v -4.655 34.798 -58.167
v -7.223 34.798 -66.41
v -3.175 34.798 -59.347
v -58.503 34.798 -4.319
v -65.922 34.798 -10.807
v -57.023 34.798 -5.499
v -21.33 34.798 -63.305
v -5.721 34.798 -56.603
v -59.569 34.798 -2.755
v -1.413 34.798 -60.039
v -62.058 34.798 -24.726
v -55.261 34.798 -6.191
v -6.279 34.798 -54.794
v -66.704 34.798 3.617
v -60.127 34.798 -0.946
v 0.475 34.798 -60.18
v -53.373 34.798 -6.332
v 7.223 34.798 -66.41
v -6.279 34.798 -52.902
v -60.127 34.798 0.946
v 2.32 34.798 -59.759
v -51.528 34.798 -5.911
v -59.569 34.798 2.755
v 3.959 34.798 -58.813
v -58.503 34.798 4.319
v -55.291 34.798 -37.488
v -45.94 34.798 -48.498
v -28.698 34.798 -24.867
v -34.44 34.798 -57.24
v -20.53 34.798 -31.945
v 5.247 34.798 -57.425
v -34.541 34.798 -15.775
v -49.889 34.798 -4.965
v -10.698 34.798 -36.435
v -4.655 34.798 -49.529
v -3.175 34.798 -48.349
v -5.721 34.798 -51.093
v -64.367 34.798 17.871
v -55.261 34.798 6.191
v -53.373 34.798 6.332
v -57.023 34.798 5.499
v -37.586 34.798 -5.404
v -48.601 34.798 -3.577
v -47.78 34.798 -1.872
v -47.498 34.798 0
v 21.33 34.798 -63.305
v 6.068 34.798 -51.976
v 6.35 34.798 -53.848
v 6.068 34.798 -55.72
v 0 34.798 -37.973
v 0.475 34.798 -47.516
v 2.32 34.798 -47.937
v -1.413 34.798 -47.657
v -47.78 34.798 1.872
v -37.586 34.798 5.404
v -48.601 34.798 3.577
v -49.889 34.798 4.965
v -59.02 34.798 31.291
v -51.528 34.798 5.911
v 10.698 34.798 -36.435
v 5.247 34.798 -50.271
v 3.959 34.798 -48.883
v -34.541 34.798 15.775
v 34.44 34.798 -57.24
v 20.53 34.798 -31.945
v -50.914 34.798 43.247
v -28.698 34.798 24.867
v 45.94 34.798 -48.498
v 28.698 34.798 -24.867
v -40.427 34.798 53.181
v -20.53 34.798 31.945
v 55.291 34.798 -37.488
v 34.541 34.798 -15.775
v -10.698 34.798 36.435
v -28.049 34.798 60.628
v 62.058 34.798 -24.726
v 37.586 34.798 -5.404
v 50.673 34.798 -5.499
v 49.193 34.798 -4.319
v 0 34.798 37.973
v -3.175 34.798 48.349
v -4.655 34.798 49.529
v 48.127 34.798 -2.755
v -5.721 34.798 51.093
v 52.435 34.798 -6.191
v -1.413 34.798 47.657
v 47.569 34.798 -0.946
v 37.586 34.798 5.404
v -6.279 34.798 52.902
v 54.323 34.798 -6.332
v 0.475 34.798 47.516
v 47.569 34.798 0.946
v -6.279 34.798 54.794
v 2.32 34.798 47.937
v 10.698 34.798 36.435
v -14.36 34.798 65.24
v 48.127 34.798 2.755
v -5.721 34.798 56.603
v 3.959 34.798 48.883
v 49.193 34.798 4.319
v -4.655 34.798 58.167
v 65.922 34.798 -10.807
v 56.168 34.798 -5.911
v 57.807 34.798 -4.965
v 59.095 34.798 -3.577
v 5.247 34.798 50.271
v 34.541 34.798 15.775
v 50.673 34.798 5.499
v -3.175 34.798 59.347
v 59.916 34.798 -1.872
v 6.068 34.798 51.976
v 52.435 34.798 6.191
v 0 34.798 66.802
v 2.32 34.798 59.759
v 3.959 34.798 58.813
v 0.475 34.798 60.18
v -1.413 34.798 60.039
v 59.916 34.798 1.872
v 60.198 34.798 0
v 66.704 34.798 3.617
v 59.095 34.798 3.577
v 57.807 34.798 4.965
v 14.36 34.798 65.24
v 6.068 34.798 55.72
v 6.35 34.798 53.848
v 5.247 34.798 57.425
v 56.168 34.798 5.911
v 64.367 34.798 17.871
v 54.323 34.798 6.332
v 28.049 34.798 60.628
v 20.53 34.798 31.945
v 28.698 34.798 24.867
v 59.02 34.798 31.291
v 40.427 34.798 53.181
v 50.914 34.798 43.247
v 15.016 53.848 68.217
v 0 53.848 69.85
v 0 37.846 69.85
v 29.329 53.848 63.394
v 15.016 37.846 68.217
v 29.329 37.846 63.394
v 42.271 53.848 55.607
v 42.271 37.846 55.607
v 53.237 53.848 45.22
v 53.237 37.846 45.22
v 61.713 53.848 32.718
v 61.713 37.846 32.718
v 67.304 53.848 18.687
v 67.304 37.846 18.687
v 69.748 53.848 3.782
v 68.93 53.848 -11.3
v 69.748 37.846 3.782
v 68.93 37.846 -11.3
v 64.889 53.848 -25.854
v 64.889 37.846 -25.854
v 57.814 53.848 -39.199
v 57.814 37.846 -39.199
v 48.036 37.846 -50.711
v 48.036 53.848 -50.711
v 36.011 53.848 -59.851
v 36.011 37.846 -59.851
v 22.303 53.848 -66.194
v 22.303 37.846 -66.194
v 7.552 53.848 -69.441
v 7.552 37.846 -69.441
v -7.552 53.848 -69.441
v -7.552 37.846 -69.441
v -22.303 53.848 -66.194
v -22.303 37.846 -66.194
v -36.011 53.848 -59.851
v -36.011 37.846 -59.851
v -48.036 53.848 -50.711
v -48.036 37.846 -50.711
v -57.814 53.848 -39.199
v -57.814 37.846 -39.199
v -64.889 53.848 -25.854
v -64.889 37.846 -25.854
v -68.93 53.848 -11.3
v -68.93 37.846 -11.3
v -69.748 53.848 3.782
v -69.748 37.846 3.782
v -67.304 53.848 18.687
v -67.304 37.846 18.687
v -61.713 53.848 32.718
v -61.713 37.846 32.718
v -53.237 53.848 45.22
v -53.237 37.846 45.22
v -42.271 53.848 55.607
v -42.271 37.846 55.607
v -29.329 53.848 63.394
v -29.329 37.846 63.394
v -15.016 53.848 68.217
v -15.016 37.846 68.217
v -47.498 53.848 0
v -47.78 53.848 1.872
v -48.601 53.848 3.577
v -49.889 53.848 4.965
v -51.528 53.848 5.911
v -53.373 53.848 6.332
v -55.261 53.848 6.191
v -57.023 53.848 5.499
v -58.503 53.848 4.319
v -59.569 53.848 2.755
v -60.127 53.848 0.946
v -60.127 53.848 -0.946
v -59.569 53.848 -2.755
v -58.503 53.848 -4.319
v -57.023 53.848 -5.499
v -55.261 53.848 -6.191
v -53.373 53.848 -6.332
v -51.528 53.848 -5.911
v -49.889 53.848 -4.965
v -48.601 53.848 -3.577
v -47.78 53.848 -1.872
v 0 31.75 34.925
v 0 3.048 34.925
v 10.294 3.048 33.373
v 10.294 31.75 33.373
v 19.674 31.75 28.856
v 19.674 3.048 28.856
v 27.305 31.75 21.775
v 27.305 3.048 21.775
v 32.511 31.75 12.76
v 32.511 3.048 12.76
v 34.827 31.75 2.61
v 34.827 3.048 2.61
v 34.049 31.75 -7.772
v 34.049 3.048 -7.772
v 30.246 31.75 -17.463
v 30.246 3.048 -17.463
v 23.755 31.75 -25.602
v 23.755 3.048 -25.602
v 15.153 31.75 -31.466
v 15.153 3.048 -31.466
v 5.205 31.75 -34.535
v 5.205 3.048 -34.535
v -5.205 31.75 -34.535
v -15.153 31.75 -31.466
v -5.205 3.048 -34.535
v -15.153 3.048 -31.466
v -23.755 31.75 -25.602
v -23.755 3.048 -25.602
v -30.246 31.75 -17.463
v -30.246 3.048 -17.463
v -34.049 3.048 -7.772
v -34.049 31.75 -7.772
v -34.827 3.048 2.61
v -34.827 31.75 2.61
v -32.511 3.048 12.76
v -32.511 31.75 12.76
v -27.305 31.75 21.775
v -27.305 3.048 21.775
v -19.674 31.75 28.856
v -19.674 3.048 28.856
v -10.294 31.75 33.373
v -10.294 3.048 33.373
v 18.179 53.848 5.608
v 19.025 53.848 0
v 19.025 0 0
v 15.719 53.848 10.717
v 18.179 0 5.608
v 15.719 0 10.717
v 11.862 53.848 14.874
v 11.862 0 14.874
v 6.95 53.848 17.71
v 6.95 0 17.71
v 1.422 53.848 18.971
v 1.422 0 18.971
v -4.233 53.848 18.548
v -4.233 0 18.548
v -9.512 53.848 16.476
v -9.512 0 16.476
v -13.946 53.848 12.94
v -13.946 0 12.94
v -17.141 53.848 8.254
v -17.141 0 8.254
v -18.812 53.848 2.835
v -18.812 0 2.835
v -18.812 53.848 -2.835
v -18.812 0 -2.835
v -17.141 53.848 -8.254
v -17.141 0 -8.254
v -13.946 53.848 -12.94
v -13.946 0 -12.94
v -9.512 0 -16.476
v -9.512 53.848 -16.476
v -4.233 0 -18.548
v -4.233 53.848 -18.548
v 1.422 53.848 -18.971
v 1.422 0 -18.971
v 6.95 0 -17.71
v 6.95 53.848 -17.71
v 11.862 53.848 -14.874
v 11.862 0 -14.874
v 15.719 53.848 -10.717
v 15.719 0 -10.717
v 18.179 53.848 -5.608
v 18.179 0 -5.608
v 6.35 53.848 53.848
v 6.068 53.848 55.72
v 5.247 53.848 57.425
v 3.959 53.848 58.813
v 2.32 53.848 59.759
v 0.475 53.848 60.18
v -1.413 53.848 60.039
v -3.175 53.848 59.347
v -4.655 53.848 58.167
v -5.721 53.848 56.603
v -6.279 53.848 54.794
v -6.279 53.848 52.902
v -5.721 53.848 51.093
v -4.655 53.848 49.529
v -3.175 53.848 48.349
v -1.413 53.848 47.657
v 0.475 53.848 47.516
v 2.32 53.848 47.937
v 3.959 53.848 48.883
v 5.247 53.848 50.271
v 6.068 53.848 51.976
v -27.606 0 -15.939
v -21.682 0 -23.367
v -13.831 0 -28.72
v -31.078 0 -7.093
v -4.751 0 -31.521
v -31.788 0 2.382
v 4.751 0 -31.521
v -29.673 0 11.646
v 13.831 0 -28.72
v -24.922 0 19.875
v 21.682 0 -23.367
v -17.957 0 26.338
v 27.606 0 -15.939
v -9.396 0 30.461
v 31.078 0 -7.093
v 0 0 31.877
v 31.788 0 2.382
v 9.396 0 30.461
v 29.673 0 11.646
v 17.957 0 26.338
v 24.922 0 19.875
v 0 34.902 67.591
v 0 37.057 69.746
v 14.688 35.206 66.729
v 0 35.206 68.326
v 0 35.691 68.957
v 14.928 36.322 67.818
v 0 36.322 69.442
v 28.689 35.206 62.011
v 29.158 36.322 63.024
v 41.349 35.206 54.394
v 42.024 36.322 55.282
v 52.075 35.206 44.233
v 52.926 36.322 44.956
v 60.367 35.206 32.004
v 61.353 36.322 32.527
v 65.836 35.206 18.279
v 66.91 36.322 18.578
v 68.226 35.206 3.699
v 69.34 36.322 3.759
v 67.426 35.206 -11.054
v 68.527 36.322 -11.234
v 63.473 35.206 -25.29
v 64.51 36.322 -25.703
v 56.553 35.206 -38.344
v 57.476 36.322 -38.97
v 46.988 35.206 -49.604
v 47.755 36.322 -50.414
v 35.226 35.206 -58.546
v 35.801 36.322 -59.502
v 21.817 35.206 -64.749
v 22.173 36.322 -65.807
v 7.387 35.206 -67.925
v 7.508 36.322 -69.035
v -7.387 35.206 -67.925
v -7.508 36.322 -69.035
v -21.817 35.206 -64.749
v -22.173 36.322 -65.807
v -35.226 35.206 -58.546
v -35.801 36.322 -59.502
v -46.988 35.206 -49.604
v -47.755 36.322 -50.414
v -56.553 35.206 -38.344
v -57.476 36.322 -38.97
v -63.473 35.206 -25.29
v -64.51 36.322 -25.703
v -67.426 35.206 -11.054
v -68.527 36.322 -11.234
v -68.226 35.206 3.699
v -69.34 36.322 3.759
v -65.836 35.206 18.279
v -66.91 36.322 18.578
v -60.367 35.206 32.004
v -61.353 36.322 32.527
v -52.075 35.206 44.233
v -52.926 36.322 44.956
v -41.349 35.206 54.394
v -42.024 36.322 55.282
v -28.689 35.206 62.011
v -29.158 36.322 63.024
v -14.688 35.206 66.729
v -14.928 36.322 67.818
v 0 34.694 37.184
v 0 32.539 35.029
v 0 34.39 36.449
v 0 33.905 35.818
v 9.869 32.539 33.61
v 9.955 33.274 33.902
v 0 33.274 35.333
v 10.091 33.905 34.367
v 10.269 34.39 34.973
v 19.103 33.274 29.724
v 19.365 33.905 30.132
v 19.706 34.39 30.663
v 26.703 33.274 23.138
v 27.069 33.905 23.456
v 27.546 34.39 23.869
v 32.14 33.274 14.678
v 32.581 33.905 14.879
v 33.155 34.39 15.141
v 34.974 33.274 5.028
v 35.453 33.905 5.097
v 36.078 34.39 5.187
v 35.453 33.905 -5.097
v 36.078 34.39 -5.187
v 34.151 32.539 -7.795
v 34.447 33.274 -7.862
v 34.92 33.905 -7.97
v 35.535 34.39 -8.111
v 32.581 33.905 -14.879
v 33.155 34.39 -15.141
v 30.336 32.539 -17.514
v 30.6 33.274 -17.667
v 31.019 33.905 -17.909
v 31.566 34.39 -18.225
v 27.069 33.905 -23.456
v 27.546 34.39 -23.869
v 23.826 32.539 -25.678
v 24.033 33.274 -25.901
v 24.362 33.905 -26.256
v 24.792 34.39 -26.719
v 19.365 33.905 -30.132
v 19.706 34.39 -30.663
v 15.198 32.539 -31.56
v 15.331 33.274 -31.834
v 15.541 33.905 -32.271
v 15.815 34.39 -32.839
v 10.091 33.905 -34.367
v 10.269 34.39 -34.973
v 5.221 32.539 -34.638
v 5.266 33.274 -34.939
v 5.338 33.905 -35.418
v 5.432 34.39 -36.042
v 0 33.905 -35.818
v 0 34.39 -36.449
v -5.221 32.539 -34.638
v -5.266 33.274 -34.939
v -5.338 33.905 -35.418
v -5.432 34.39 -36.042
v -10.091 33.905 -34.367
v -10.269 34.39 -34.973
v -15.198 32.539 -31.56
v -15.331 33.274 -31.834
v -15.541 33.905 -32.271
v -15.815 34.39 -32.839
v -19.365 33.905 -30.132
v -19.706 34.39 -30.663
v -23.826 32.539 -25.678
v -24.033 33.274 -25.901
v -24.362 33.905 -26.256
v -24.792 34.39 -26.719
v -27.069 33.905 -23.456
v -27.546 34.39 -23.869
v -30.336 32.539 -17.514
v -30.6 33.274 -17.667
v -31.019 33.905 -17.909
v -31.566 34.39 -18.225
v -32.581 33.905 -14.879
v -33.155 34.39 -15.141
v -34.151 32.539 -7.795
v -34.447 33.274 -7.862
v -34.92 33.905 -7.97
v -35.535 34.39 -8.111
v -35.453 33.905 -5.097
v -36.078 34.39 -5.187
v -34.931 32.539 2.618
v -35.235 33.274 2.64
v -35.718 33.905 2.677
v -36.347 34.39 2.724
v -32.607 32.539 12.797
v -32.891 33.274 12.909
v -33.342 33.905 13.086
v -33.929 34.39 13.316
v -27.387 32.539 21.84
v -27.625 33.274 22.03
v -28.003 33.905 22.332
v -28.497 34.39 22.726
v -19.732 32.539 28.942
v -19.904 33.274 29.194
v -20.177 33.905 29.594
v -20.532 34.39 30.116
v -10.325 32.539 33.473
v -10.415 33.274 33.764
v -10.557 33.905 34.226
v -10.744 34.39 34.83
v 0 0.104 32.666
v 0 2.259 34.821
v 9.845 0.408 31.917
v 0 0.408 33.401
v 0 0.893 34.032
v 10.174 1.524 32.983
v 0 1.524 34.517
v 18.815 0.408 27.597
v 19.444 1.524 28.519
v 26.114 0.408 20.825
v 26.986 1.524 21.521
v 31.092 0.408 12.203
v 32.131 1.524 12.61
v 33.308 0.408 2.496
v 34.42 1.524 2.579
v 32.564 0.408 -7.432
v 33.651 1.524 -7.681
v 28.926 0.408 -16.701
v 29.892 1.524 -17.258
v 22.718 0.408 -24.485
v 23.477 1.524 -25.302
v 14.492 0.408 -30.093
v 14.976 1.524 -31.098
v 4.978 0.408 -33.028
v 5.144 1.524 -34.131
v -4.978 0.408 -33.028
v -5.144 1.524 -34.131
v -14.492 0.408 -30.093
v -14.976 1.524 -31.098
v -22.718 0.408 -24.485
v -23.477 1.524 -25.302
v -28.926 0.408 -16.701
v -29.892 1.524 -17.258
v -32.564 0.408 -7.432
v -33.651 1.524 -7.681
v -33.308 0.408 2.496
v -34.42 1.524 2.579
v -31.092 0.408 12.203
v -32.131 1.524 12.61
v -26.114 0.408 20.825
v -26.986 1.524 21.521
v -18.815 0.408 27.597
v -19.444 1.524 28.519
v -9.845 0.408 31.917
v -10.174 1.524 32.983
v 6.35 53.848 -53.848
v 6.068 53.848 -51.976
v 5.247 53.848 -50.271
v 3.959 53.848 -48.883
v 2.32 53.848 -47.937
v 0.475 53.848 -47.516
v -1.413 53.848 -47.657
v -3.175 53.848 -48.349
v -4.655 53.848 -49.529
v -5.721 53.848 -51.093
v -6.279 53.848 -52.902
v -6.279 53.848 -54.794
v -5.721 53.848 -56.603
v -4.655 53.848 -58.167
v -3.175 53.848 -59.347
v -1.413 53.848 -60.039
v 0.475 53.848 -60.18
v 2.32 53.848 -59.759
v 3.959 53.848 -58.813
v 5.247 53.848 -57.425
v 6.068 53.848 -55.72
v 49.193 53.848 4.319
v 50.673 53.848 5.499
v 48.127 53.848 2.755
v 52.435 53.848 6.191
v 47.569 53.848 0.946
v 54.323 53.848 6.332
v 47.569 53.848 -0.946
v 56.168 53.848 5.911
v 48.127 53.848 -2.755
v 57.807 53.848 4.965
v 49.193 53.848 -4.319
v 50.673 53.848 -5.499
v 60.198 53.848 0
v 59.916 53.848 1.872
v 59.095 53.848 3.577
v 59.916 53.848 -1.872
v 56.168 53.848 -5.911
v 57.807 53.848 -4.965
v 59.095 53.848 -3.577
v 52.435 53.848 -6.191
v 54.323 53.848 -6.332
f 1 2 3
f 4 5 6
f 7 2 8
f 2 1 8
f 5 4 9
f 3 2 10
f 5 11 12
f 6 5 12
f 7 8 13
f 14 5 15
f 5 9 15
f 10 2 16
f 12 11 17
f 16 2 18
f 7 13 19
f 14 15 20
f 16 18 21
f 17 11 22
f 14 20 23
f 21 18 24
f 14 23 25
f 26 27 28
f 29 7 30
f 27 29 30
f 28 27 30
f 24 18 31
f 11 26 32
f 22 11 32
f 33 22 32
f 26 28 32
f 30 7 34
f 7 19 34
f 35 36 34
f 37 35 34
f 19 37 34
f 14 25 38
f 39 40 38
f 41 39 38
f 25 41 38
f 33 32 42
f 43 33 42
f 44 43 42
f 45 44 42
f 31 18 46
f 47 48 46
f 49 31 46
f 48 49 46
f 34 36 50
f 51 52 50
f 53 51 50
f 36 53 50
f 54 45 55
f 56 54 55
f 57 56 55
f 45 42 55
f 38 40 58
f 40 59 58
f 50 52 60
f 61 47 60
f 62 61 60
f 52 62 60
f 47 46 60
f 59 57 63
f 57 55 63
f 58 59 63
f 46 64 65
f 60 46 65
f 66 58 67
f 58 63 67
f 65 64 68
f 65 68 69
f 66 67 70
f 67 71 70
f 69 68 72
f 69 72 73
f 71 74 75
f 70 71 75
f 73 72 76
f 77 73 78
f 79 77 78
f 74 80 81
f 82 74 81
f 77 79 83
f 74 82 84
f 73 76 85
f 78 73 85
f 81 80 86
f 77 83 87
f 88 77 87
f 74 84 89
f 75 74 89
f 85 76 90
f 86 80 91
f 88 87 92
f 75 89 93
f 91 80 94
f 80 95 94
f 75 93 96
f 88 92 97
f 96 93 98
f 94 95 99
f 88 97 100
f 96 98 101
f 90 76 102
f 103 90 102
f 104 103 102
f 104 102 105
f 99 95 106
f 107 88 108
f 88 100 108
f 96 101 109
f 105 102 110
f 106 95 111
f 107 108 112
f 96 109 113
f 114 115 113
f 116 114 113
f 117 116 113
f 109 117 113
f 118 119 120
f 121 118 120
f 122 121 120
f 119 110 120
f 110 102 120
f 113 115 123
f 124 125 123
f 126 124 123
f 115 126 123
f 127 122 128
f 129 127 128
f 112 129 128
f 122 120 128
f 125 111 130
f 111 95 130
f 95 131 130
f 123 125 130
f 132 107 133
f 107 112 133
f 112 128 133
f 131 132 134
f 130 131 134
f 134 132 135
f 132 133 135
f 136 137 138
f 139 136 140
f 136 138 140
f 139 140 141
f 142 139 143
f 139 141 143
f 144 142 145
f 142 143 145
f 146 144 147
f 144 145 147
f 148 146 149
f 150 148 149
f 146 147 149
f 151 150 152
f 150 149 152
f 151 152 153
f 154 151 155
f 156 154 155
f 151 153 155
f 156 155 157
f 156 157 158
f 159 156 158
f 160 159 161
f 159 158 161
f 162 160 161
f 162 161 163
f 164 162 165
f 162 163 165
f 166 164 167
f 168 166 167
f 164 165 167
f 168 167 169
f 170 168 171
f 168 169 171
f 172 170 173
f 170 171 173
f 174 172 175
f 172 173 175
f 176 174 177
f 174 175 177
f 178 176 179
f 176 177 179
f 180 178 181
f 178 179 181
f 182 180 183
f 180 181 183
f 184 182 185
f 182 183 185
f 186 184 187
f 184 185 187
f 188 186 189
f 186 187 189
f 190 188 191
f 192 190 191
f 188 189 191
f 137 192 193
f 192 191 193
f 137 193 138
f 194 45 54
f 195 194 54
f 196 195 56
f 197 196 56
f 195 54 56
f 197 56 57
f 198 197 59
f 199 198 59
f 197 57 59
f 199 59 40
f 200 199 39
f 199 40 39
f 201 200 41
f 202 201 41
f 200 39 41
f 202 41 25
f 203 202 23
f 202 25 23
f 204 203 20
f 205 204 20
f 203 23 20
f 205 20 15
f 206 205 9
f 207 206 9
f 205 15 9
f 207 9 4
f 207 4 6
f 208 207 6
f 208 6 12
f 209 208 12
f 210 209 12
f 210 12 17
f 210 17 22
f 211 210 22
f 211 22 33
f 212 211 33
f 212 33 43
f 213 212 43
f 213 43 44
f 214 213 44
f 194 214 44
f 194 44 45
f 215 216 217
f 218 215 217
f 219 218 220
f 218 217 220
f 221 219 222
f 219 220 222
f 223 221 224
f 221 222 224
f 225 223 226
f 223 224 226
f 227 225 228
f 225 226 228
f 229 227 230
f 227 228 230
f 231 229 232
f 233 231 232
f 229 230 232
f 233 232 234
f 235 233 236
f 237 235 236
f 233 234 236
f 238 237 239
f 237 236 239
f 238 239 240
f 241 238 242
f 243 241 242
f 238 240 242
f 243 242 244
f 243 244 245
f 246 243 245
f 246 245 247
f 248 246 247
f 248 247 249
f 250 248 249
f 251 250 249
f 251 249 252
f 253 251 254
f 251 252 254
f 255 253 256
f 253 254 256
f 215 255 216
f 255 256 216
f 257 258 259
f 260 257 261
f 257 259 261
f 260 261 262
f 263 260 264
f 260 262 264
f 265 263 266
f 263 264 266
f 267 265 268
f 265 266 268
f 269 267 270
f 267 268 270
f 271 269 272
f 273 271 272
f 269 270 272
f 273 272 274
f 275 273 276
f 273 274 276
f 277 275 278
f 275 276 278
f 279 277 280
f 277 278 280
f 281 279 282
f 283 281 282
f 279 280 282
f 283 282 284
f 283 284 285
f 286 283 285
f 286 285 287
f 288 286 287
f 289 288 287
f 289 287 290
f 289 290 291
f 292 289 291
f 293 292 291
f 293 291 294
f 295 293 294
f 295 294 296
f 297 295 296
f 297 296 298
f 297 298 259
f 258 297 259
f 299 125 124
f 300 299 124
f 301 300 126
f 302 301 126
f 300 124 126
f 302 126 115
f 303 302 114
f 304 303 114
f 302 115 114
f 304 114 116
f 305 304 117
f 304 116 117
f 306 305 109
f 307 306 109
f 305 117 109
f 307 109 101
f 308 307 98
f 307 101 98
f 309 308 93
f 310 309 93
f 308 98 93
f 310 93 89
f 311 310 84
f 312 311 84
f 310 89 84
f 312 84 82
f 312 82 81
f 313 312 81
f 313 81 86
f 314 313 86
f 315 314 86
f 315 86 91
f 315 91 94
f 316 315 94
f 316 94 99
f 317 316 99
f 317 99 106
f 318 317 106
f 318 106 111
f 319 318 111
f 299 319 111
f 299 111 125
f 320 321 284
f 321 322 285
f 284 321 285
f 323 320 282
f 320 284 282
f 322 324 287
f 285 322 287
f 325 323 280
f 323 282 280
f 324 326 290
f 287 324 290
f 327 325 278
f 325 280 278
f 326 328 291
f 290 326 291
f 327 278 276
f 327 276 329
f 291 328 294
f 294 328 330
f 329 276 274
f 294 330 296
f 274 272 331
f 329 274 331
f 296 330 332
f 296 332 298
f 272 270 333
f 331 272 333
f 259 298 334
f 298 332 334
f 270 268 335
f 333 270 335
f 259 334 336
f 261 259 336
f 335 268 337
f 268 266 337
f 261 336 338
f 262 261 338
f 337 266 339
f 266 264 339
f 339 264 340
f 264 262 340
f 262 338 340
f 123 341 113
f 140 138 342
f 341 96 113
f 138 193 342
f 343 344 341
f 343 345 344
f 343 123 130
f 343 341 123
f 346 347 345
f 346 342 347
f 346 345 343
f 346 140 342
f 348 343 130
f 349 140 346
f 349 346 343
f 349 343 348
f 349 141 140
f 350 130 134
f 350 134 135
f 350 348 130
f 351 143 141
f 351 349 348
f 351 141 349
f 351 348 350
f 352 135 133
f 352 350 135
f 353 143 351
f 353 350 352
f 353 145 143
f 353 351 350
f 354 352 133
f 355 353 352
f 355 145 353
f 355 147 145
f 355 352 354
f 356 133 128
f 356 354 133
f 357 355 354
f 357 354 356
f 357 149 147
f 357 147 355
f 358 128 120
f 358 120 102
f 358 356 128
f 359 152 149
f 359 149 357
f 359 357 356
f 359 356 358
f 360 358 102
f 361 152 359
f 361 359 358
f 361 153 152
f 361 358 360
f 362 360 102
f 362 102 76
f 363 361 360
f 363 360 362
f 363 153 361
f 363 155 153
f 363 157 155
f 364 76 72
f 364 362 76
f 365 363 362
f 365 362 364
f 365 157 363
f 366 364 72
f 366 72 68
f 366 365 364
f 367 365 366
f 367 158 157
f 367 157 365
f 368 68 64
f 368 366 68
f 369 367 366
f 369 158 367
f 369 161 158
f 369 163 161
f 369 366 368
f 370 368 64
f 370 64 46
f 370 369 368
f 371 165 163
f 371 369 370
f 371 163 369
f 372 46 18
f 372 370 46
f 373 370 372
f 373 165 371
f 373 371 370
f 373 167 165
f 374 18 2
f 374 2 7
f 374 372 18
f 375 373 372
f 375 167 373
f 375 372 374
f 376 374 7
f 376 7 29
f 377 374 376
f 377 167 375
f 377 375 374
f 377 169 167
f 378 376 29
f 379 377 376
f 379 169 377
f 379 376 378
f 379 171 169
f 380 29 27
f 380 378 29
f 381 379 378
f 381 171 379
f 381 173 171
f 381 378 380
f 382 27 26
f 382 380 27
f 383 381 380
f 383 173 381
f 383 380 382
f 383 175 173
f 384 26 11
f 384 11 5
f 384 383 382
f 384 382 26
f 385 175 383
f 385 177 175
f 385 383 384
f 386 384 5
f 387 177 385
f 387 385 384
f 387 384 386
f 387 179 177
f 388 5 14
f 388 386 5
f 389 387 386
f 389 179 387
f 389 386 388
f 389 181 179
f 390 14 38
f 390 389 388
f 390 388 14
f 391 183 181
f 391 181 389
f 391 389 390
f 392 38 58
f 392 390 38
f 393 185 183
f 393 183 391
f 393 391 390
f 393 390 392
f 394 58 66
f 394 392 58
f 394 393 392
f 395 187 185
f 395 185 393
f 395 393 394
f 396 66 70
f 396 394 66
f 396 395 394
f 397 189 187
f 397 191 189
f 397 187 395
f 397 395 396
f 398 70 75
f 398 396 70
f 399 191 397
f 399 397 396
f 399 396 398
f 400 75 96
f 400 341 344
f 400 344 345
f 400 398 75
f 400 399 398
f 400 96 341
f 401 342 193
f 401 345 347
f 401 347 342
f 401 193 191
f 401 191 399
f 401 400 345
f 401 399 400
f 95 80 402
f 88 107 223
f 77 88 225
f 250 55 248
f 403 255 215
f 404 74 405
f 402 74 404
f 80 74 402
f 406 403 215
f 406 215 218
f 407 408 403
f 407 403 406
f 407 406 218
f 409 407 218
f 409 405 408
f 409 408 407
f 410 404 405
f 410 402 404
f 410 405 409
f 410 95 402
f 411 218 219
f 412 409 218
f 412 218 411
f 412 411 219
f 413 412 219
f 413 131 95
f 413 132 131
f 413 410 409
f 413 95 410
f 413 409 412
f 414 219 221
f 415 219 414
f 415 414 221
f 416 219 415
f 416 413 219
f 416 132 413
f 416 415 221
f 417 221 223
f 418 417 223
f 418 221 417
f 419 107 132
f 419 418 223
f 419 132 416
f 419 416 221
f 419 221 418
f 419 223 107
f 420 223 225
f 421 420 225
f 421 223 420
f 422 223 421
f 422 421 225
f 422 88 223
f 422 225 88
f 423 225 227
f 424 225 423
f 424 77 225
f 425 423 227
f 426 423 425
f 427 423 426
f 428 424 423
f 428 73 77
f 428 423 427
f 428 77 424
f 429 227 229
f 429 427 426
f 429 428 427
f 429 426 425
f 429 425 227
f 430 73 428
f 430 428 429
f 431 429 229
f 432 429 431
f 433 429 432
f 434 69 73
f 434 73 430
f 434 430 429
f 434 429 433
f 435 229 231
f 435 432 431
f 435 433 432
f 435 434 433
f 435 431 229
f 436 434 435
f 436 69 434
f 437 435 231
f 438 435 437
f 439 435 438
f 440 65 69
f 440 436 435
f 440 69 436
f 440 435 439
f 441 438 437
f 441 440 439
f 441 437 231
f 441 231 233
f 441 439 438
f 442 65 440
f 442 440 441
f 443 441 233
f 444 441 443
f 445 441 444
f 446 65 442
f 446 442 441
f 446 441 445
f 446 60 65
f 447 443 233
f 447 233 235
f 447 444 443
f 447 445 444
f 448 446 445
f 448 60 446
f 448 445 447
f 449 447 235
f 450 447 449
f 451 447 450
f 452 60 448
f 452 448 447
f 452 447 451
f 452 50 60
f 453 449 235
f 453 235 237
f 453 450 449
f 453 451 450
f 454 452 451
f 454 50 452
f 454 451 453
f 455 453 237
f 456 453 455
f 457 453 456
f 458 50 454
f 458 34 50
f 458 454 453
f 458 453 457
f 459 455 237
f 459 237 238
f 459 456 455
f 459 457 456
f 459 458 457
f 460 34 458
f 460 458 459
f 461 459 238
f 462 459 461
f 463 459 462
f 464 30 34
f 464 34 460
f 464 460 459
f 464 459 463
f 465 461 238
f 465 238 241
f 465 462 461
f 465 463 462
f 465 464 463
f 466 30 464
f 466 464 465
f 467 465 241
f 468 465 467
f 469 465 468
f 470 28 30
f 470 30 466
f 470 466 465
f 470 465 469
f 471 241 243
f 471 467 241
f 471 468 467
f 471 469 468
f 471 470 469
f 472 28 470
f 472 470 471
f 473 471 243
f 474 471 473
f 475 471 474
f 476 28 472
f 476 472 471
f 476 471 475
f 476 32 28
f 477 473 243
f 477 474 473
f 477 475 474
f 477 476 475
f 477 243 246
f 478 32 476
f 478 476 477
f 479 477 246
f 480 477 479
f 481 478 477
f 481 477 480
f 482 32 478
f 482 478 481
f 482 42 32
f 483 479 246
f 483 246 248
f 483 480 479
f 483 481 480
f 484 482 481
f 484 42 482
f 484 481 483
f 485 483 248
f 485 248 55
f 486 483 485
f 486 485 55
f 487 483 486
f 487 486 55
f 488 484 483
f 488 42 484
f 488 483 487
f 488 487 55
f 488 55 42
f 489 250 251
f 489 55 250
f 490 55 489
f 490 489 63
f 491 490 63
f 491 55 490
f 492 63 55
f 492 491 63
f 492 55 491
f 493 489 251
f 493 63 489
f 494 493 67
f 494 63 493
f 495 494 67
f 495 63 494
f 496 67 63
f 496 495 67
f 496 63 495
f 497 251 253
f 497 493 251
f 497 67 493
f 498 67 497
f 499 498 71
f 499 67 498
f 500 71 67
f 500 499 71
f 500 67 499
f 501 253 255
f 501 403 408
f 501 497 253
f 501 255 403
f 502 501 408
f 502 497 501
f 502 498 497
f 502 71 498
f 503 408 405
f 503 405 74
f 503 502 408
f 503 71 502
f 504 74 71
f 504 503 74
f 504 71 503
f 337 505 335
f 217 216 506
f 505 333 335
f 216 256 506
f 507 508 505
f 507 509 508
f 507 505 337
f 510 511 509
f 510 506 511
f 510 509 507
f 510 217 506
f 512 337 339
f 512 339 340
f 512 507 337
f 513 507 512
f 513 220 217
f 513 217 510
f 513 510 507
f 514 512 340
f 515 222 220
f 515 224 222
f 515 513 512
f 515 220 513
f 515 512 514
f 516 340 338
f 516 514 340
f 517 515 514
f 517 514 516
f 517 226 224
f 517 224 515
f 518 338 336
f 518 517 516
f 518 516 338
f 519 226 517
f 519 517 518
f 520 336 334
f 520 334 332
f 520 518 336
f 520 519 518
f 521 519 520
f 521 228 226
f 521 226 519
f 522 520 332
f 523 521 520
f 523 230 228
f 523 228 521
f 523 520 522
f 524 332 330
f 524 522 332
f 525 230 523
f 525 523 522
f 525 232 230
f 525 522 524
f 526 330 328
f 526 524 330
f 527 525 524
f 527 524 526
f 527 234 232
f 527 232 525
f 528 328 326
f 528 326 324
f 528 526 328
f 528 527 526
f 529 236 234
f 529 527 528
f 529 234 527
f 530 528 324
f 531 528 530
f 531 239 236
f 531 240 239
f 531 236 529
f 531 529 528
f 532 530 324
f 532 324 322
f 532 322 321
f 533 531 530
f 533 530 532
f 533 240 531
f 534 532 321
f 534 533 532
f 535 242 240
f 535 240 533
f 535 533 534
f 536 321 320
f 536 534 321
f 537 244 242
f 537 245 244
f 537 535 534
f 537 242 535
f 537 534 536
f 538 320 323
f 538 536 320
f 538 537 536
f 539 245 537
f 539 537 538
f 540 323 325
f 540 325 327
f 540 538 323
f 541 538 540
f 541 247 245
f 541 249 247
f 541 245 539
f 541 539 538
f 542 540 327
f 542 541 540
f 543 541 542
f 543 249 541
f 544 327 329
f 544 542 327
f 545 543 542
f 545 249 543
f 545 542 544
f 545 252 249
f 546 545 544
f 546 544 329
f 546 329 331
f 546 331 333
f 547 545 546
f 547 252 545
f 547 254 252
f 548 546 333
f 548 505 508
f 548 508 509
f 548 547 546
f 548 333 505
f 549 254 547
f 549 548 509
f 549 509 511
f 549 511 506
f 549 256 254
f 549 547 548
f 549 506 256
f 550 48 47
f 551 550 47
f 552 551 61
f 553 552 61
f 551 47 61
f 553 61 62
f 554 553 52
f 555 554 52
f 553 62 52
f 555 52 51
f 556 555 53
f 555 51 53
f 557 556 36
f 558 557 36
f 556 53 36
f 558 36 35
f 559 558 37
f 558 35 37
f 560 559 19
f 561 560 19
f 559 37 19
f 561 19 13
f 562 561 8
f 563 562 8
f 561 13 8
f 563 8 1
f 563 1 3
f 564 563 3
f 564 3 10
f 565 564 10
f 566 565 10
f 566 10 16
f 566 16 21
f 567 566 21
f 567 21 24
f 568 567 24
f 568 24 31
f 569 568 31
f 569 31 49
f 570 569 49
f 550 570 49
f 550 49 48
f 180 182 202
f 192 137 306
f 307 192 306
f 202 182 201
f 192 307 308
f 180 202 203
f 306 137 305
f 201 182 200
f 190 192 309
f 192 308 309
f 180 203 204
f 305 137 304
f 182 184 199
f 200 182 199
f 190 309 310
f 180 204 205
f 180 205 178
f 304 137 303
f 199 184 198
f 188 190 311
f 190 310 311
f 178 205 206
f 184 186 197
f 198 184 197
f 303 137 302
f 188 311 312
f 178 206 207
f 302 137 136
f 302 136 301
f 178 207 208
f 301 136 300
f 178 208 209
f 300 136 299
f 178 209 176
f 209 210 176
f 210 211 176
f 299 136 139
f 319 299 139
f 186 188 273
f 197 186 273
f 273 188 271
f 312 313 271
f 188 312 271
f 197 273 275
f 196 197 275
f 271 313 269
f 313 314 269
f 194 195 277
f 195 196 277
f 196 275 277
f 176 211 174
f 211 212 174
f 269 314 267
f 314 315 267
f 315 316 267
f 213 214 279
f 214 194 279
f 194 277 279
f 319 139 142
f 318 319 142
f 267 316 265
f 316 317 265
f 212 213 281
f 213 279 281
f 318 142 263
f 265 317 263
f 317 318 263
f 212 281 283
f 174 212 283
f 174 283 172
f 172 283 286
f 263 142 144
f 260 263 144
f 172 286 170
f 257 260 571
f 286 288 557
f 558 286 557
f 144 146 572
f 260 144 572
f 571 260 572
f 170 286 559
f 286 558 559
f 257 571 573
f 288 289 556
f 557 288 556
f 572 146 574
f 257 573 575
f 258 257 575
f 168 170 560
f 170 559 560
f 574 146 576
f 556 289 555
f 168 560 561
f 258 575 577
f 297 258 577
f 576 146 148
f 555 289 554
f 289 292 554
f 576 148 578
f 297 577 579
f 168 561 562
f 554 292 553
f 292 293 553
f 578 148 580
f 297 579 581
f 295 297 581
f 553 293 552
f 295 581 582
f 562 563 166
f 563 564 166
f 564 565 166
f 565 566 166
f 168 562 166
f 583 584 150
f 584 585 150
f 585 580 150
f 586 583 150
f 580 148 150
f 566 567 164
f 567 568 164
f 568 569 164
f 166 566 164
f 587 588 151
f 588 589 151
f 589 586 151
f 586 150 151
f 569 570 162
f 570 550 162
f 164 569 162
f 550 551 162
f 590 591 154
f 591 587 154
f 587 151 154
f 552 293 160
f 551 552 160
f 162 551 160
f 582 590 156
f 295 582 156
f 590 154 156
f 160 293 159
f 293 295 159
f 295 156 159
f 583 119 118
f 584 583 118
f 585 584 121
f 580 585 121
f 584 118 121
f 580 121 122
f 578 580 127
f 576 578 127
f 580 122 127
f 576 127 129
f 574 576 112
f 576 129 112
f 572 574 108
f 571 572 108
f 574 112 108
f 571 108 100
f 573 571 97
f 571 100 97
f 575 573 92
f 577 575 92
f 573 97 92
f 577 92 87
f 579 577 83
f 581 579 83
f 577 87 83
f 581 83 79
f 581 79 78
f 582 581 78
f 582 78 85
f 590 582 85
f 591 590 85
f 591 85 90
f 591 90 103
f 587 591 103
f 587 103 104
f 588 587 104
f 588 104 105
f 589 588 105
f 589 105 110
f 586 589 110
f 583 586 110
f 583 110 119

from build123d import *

# Parameters (mm, degrees)
F2_R     = 19.0246
F3_DEPTH = 53.849
F4_R     = 6.35
F5_DEPTH = 19.051
F6_R     = 3.048


# Not quite as in the source:
# - a feature names something its author has since deleted; it is built from what else it names


with BuildPart() as f1:
    # F0 (on Right) → F1 (revolve)
    with BuildSketch(Plane.YZ):
        Polygon((0, 34.925), (0, 0), (53.848, 0), (53.848, 69.85), (34.798, 69.85), (34.798, 34.925), align=None)
    revolve(axis=Axis((0, 26.924, 0), (0, 1, 0)))

    # F2 (on face) → F3 (cut, through all)
    with BuildSketch(Plane.XZ):
        Circle(F2_R)
    extrude(amount=-F3_DEPTH, mode=Mode.SUBTRACT)

    # F4 (on face) → F5 (cut, through all)
    with BuildSketch(Plane.XZ.offset(-34.798)):
        with Locations((0, 53.848)):
            Circle(F4_R)
        with Locations((-53.848, 0)):
            Circle(F4_R)
        with Locations((53.848, 0)):
            Circle(F4_R)
        with Locations((0, -53.848)):
            Circle(F4_R)
    extrude(amount=-F5_DEPTH, mode=Mode.SUBTRACT)

    # F6
    f6_edges = [f1.edges().sort_by_distance(p)[0] for p in [
        (0, 34.798, -34.925),
        (0, 0, -34.925),
        (0, 34.798, -69.85),
    ]]
    fillet(f6_edges, radius=F6_R)


solid = f1.part
